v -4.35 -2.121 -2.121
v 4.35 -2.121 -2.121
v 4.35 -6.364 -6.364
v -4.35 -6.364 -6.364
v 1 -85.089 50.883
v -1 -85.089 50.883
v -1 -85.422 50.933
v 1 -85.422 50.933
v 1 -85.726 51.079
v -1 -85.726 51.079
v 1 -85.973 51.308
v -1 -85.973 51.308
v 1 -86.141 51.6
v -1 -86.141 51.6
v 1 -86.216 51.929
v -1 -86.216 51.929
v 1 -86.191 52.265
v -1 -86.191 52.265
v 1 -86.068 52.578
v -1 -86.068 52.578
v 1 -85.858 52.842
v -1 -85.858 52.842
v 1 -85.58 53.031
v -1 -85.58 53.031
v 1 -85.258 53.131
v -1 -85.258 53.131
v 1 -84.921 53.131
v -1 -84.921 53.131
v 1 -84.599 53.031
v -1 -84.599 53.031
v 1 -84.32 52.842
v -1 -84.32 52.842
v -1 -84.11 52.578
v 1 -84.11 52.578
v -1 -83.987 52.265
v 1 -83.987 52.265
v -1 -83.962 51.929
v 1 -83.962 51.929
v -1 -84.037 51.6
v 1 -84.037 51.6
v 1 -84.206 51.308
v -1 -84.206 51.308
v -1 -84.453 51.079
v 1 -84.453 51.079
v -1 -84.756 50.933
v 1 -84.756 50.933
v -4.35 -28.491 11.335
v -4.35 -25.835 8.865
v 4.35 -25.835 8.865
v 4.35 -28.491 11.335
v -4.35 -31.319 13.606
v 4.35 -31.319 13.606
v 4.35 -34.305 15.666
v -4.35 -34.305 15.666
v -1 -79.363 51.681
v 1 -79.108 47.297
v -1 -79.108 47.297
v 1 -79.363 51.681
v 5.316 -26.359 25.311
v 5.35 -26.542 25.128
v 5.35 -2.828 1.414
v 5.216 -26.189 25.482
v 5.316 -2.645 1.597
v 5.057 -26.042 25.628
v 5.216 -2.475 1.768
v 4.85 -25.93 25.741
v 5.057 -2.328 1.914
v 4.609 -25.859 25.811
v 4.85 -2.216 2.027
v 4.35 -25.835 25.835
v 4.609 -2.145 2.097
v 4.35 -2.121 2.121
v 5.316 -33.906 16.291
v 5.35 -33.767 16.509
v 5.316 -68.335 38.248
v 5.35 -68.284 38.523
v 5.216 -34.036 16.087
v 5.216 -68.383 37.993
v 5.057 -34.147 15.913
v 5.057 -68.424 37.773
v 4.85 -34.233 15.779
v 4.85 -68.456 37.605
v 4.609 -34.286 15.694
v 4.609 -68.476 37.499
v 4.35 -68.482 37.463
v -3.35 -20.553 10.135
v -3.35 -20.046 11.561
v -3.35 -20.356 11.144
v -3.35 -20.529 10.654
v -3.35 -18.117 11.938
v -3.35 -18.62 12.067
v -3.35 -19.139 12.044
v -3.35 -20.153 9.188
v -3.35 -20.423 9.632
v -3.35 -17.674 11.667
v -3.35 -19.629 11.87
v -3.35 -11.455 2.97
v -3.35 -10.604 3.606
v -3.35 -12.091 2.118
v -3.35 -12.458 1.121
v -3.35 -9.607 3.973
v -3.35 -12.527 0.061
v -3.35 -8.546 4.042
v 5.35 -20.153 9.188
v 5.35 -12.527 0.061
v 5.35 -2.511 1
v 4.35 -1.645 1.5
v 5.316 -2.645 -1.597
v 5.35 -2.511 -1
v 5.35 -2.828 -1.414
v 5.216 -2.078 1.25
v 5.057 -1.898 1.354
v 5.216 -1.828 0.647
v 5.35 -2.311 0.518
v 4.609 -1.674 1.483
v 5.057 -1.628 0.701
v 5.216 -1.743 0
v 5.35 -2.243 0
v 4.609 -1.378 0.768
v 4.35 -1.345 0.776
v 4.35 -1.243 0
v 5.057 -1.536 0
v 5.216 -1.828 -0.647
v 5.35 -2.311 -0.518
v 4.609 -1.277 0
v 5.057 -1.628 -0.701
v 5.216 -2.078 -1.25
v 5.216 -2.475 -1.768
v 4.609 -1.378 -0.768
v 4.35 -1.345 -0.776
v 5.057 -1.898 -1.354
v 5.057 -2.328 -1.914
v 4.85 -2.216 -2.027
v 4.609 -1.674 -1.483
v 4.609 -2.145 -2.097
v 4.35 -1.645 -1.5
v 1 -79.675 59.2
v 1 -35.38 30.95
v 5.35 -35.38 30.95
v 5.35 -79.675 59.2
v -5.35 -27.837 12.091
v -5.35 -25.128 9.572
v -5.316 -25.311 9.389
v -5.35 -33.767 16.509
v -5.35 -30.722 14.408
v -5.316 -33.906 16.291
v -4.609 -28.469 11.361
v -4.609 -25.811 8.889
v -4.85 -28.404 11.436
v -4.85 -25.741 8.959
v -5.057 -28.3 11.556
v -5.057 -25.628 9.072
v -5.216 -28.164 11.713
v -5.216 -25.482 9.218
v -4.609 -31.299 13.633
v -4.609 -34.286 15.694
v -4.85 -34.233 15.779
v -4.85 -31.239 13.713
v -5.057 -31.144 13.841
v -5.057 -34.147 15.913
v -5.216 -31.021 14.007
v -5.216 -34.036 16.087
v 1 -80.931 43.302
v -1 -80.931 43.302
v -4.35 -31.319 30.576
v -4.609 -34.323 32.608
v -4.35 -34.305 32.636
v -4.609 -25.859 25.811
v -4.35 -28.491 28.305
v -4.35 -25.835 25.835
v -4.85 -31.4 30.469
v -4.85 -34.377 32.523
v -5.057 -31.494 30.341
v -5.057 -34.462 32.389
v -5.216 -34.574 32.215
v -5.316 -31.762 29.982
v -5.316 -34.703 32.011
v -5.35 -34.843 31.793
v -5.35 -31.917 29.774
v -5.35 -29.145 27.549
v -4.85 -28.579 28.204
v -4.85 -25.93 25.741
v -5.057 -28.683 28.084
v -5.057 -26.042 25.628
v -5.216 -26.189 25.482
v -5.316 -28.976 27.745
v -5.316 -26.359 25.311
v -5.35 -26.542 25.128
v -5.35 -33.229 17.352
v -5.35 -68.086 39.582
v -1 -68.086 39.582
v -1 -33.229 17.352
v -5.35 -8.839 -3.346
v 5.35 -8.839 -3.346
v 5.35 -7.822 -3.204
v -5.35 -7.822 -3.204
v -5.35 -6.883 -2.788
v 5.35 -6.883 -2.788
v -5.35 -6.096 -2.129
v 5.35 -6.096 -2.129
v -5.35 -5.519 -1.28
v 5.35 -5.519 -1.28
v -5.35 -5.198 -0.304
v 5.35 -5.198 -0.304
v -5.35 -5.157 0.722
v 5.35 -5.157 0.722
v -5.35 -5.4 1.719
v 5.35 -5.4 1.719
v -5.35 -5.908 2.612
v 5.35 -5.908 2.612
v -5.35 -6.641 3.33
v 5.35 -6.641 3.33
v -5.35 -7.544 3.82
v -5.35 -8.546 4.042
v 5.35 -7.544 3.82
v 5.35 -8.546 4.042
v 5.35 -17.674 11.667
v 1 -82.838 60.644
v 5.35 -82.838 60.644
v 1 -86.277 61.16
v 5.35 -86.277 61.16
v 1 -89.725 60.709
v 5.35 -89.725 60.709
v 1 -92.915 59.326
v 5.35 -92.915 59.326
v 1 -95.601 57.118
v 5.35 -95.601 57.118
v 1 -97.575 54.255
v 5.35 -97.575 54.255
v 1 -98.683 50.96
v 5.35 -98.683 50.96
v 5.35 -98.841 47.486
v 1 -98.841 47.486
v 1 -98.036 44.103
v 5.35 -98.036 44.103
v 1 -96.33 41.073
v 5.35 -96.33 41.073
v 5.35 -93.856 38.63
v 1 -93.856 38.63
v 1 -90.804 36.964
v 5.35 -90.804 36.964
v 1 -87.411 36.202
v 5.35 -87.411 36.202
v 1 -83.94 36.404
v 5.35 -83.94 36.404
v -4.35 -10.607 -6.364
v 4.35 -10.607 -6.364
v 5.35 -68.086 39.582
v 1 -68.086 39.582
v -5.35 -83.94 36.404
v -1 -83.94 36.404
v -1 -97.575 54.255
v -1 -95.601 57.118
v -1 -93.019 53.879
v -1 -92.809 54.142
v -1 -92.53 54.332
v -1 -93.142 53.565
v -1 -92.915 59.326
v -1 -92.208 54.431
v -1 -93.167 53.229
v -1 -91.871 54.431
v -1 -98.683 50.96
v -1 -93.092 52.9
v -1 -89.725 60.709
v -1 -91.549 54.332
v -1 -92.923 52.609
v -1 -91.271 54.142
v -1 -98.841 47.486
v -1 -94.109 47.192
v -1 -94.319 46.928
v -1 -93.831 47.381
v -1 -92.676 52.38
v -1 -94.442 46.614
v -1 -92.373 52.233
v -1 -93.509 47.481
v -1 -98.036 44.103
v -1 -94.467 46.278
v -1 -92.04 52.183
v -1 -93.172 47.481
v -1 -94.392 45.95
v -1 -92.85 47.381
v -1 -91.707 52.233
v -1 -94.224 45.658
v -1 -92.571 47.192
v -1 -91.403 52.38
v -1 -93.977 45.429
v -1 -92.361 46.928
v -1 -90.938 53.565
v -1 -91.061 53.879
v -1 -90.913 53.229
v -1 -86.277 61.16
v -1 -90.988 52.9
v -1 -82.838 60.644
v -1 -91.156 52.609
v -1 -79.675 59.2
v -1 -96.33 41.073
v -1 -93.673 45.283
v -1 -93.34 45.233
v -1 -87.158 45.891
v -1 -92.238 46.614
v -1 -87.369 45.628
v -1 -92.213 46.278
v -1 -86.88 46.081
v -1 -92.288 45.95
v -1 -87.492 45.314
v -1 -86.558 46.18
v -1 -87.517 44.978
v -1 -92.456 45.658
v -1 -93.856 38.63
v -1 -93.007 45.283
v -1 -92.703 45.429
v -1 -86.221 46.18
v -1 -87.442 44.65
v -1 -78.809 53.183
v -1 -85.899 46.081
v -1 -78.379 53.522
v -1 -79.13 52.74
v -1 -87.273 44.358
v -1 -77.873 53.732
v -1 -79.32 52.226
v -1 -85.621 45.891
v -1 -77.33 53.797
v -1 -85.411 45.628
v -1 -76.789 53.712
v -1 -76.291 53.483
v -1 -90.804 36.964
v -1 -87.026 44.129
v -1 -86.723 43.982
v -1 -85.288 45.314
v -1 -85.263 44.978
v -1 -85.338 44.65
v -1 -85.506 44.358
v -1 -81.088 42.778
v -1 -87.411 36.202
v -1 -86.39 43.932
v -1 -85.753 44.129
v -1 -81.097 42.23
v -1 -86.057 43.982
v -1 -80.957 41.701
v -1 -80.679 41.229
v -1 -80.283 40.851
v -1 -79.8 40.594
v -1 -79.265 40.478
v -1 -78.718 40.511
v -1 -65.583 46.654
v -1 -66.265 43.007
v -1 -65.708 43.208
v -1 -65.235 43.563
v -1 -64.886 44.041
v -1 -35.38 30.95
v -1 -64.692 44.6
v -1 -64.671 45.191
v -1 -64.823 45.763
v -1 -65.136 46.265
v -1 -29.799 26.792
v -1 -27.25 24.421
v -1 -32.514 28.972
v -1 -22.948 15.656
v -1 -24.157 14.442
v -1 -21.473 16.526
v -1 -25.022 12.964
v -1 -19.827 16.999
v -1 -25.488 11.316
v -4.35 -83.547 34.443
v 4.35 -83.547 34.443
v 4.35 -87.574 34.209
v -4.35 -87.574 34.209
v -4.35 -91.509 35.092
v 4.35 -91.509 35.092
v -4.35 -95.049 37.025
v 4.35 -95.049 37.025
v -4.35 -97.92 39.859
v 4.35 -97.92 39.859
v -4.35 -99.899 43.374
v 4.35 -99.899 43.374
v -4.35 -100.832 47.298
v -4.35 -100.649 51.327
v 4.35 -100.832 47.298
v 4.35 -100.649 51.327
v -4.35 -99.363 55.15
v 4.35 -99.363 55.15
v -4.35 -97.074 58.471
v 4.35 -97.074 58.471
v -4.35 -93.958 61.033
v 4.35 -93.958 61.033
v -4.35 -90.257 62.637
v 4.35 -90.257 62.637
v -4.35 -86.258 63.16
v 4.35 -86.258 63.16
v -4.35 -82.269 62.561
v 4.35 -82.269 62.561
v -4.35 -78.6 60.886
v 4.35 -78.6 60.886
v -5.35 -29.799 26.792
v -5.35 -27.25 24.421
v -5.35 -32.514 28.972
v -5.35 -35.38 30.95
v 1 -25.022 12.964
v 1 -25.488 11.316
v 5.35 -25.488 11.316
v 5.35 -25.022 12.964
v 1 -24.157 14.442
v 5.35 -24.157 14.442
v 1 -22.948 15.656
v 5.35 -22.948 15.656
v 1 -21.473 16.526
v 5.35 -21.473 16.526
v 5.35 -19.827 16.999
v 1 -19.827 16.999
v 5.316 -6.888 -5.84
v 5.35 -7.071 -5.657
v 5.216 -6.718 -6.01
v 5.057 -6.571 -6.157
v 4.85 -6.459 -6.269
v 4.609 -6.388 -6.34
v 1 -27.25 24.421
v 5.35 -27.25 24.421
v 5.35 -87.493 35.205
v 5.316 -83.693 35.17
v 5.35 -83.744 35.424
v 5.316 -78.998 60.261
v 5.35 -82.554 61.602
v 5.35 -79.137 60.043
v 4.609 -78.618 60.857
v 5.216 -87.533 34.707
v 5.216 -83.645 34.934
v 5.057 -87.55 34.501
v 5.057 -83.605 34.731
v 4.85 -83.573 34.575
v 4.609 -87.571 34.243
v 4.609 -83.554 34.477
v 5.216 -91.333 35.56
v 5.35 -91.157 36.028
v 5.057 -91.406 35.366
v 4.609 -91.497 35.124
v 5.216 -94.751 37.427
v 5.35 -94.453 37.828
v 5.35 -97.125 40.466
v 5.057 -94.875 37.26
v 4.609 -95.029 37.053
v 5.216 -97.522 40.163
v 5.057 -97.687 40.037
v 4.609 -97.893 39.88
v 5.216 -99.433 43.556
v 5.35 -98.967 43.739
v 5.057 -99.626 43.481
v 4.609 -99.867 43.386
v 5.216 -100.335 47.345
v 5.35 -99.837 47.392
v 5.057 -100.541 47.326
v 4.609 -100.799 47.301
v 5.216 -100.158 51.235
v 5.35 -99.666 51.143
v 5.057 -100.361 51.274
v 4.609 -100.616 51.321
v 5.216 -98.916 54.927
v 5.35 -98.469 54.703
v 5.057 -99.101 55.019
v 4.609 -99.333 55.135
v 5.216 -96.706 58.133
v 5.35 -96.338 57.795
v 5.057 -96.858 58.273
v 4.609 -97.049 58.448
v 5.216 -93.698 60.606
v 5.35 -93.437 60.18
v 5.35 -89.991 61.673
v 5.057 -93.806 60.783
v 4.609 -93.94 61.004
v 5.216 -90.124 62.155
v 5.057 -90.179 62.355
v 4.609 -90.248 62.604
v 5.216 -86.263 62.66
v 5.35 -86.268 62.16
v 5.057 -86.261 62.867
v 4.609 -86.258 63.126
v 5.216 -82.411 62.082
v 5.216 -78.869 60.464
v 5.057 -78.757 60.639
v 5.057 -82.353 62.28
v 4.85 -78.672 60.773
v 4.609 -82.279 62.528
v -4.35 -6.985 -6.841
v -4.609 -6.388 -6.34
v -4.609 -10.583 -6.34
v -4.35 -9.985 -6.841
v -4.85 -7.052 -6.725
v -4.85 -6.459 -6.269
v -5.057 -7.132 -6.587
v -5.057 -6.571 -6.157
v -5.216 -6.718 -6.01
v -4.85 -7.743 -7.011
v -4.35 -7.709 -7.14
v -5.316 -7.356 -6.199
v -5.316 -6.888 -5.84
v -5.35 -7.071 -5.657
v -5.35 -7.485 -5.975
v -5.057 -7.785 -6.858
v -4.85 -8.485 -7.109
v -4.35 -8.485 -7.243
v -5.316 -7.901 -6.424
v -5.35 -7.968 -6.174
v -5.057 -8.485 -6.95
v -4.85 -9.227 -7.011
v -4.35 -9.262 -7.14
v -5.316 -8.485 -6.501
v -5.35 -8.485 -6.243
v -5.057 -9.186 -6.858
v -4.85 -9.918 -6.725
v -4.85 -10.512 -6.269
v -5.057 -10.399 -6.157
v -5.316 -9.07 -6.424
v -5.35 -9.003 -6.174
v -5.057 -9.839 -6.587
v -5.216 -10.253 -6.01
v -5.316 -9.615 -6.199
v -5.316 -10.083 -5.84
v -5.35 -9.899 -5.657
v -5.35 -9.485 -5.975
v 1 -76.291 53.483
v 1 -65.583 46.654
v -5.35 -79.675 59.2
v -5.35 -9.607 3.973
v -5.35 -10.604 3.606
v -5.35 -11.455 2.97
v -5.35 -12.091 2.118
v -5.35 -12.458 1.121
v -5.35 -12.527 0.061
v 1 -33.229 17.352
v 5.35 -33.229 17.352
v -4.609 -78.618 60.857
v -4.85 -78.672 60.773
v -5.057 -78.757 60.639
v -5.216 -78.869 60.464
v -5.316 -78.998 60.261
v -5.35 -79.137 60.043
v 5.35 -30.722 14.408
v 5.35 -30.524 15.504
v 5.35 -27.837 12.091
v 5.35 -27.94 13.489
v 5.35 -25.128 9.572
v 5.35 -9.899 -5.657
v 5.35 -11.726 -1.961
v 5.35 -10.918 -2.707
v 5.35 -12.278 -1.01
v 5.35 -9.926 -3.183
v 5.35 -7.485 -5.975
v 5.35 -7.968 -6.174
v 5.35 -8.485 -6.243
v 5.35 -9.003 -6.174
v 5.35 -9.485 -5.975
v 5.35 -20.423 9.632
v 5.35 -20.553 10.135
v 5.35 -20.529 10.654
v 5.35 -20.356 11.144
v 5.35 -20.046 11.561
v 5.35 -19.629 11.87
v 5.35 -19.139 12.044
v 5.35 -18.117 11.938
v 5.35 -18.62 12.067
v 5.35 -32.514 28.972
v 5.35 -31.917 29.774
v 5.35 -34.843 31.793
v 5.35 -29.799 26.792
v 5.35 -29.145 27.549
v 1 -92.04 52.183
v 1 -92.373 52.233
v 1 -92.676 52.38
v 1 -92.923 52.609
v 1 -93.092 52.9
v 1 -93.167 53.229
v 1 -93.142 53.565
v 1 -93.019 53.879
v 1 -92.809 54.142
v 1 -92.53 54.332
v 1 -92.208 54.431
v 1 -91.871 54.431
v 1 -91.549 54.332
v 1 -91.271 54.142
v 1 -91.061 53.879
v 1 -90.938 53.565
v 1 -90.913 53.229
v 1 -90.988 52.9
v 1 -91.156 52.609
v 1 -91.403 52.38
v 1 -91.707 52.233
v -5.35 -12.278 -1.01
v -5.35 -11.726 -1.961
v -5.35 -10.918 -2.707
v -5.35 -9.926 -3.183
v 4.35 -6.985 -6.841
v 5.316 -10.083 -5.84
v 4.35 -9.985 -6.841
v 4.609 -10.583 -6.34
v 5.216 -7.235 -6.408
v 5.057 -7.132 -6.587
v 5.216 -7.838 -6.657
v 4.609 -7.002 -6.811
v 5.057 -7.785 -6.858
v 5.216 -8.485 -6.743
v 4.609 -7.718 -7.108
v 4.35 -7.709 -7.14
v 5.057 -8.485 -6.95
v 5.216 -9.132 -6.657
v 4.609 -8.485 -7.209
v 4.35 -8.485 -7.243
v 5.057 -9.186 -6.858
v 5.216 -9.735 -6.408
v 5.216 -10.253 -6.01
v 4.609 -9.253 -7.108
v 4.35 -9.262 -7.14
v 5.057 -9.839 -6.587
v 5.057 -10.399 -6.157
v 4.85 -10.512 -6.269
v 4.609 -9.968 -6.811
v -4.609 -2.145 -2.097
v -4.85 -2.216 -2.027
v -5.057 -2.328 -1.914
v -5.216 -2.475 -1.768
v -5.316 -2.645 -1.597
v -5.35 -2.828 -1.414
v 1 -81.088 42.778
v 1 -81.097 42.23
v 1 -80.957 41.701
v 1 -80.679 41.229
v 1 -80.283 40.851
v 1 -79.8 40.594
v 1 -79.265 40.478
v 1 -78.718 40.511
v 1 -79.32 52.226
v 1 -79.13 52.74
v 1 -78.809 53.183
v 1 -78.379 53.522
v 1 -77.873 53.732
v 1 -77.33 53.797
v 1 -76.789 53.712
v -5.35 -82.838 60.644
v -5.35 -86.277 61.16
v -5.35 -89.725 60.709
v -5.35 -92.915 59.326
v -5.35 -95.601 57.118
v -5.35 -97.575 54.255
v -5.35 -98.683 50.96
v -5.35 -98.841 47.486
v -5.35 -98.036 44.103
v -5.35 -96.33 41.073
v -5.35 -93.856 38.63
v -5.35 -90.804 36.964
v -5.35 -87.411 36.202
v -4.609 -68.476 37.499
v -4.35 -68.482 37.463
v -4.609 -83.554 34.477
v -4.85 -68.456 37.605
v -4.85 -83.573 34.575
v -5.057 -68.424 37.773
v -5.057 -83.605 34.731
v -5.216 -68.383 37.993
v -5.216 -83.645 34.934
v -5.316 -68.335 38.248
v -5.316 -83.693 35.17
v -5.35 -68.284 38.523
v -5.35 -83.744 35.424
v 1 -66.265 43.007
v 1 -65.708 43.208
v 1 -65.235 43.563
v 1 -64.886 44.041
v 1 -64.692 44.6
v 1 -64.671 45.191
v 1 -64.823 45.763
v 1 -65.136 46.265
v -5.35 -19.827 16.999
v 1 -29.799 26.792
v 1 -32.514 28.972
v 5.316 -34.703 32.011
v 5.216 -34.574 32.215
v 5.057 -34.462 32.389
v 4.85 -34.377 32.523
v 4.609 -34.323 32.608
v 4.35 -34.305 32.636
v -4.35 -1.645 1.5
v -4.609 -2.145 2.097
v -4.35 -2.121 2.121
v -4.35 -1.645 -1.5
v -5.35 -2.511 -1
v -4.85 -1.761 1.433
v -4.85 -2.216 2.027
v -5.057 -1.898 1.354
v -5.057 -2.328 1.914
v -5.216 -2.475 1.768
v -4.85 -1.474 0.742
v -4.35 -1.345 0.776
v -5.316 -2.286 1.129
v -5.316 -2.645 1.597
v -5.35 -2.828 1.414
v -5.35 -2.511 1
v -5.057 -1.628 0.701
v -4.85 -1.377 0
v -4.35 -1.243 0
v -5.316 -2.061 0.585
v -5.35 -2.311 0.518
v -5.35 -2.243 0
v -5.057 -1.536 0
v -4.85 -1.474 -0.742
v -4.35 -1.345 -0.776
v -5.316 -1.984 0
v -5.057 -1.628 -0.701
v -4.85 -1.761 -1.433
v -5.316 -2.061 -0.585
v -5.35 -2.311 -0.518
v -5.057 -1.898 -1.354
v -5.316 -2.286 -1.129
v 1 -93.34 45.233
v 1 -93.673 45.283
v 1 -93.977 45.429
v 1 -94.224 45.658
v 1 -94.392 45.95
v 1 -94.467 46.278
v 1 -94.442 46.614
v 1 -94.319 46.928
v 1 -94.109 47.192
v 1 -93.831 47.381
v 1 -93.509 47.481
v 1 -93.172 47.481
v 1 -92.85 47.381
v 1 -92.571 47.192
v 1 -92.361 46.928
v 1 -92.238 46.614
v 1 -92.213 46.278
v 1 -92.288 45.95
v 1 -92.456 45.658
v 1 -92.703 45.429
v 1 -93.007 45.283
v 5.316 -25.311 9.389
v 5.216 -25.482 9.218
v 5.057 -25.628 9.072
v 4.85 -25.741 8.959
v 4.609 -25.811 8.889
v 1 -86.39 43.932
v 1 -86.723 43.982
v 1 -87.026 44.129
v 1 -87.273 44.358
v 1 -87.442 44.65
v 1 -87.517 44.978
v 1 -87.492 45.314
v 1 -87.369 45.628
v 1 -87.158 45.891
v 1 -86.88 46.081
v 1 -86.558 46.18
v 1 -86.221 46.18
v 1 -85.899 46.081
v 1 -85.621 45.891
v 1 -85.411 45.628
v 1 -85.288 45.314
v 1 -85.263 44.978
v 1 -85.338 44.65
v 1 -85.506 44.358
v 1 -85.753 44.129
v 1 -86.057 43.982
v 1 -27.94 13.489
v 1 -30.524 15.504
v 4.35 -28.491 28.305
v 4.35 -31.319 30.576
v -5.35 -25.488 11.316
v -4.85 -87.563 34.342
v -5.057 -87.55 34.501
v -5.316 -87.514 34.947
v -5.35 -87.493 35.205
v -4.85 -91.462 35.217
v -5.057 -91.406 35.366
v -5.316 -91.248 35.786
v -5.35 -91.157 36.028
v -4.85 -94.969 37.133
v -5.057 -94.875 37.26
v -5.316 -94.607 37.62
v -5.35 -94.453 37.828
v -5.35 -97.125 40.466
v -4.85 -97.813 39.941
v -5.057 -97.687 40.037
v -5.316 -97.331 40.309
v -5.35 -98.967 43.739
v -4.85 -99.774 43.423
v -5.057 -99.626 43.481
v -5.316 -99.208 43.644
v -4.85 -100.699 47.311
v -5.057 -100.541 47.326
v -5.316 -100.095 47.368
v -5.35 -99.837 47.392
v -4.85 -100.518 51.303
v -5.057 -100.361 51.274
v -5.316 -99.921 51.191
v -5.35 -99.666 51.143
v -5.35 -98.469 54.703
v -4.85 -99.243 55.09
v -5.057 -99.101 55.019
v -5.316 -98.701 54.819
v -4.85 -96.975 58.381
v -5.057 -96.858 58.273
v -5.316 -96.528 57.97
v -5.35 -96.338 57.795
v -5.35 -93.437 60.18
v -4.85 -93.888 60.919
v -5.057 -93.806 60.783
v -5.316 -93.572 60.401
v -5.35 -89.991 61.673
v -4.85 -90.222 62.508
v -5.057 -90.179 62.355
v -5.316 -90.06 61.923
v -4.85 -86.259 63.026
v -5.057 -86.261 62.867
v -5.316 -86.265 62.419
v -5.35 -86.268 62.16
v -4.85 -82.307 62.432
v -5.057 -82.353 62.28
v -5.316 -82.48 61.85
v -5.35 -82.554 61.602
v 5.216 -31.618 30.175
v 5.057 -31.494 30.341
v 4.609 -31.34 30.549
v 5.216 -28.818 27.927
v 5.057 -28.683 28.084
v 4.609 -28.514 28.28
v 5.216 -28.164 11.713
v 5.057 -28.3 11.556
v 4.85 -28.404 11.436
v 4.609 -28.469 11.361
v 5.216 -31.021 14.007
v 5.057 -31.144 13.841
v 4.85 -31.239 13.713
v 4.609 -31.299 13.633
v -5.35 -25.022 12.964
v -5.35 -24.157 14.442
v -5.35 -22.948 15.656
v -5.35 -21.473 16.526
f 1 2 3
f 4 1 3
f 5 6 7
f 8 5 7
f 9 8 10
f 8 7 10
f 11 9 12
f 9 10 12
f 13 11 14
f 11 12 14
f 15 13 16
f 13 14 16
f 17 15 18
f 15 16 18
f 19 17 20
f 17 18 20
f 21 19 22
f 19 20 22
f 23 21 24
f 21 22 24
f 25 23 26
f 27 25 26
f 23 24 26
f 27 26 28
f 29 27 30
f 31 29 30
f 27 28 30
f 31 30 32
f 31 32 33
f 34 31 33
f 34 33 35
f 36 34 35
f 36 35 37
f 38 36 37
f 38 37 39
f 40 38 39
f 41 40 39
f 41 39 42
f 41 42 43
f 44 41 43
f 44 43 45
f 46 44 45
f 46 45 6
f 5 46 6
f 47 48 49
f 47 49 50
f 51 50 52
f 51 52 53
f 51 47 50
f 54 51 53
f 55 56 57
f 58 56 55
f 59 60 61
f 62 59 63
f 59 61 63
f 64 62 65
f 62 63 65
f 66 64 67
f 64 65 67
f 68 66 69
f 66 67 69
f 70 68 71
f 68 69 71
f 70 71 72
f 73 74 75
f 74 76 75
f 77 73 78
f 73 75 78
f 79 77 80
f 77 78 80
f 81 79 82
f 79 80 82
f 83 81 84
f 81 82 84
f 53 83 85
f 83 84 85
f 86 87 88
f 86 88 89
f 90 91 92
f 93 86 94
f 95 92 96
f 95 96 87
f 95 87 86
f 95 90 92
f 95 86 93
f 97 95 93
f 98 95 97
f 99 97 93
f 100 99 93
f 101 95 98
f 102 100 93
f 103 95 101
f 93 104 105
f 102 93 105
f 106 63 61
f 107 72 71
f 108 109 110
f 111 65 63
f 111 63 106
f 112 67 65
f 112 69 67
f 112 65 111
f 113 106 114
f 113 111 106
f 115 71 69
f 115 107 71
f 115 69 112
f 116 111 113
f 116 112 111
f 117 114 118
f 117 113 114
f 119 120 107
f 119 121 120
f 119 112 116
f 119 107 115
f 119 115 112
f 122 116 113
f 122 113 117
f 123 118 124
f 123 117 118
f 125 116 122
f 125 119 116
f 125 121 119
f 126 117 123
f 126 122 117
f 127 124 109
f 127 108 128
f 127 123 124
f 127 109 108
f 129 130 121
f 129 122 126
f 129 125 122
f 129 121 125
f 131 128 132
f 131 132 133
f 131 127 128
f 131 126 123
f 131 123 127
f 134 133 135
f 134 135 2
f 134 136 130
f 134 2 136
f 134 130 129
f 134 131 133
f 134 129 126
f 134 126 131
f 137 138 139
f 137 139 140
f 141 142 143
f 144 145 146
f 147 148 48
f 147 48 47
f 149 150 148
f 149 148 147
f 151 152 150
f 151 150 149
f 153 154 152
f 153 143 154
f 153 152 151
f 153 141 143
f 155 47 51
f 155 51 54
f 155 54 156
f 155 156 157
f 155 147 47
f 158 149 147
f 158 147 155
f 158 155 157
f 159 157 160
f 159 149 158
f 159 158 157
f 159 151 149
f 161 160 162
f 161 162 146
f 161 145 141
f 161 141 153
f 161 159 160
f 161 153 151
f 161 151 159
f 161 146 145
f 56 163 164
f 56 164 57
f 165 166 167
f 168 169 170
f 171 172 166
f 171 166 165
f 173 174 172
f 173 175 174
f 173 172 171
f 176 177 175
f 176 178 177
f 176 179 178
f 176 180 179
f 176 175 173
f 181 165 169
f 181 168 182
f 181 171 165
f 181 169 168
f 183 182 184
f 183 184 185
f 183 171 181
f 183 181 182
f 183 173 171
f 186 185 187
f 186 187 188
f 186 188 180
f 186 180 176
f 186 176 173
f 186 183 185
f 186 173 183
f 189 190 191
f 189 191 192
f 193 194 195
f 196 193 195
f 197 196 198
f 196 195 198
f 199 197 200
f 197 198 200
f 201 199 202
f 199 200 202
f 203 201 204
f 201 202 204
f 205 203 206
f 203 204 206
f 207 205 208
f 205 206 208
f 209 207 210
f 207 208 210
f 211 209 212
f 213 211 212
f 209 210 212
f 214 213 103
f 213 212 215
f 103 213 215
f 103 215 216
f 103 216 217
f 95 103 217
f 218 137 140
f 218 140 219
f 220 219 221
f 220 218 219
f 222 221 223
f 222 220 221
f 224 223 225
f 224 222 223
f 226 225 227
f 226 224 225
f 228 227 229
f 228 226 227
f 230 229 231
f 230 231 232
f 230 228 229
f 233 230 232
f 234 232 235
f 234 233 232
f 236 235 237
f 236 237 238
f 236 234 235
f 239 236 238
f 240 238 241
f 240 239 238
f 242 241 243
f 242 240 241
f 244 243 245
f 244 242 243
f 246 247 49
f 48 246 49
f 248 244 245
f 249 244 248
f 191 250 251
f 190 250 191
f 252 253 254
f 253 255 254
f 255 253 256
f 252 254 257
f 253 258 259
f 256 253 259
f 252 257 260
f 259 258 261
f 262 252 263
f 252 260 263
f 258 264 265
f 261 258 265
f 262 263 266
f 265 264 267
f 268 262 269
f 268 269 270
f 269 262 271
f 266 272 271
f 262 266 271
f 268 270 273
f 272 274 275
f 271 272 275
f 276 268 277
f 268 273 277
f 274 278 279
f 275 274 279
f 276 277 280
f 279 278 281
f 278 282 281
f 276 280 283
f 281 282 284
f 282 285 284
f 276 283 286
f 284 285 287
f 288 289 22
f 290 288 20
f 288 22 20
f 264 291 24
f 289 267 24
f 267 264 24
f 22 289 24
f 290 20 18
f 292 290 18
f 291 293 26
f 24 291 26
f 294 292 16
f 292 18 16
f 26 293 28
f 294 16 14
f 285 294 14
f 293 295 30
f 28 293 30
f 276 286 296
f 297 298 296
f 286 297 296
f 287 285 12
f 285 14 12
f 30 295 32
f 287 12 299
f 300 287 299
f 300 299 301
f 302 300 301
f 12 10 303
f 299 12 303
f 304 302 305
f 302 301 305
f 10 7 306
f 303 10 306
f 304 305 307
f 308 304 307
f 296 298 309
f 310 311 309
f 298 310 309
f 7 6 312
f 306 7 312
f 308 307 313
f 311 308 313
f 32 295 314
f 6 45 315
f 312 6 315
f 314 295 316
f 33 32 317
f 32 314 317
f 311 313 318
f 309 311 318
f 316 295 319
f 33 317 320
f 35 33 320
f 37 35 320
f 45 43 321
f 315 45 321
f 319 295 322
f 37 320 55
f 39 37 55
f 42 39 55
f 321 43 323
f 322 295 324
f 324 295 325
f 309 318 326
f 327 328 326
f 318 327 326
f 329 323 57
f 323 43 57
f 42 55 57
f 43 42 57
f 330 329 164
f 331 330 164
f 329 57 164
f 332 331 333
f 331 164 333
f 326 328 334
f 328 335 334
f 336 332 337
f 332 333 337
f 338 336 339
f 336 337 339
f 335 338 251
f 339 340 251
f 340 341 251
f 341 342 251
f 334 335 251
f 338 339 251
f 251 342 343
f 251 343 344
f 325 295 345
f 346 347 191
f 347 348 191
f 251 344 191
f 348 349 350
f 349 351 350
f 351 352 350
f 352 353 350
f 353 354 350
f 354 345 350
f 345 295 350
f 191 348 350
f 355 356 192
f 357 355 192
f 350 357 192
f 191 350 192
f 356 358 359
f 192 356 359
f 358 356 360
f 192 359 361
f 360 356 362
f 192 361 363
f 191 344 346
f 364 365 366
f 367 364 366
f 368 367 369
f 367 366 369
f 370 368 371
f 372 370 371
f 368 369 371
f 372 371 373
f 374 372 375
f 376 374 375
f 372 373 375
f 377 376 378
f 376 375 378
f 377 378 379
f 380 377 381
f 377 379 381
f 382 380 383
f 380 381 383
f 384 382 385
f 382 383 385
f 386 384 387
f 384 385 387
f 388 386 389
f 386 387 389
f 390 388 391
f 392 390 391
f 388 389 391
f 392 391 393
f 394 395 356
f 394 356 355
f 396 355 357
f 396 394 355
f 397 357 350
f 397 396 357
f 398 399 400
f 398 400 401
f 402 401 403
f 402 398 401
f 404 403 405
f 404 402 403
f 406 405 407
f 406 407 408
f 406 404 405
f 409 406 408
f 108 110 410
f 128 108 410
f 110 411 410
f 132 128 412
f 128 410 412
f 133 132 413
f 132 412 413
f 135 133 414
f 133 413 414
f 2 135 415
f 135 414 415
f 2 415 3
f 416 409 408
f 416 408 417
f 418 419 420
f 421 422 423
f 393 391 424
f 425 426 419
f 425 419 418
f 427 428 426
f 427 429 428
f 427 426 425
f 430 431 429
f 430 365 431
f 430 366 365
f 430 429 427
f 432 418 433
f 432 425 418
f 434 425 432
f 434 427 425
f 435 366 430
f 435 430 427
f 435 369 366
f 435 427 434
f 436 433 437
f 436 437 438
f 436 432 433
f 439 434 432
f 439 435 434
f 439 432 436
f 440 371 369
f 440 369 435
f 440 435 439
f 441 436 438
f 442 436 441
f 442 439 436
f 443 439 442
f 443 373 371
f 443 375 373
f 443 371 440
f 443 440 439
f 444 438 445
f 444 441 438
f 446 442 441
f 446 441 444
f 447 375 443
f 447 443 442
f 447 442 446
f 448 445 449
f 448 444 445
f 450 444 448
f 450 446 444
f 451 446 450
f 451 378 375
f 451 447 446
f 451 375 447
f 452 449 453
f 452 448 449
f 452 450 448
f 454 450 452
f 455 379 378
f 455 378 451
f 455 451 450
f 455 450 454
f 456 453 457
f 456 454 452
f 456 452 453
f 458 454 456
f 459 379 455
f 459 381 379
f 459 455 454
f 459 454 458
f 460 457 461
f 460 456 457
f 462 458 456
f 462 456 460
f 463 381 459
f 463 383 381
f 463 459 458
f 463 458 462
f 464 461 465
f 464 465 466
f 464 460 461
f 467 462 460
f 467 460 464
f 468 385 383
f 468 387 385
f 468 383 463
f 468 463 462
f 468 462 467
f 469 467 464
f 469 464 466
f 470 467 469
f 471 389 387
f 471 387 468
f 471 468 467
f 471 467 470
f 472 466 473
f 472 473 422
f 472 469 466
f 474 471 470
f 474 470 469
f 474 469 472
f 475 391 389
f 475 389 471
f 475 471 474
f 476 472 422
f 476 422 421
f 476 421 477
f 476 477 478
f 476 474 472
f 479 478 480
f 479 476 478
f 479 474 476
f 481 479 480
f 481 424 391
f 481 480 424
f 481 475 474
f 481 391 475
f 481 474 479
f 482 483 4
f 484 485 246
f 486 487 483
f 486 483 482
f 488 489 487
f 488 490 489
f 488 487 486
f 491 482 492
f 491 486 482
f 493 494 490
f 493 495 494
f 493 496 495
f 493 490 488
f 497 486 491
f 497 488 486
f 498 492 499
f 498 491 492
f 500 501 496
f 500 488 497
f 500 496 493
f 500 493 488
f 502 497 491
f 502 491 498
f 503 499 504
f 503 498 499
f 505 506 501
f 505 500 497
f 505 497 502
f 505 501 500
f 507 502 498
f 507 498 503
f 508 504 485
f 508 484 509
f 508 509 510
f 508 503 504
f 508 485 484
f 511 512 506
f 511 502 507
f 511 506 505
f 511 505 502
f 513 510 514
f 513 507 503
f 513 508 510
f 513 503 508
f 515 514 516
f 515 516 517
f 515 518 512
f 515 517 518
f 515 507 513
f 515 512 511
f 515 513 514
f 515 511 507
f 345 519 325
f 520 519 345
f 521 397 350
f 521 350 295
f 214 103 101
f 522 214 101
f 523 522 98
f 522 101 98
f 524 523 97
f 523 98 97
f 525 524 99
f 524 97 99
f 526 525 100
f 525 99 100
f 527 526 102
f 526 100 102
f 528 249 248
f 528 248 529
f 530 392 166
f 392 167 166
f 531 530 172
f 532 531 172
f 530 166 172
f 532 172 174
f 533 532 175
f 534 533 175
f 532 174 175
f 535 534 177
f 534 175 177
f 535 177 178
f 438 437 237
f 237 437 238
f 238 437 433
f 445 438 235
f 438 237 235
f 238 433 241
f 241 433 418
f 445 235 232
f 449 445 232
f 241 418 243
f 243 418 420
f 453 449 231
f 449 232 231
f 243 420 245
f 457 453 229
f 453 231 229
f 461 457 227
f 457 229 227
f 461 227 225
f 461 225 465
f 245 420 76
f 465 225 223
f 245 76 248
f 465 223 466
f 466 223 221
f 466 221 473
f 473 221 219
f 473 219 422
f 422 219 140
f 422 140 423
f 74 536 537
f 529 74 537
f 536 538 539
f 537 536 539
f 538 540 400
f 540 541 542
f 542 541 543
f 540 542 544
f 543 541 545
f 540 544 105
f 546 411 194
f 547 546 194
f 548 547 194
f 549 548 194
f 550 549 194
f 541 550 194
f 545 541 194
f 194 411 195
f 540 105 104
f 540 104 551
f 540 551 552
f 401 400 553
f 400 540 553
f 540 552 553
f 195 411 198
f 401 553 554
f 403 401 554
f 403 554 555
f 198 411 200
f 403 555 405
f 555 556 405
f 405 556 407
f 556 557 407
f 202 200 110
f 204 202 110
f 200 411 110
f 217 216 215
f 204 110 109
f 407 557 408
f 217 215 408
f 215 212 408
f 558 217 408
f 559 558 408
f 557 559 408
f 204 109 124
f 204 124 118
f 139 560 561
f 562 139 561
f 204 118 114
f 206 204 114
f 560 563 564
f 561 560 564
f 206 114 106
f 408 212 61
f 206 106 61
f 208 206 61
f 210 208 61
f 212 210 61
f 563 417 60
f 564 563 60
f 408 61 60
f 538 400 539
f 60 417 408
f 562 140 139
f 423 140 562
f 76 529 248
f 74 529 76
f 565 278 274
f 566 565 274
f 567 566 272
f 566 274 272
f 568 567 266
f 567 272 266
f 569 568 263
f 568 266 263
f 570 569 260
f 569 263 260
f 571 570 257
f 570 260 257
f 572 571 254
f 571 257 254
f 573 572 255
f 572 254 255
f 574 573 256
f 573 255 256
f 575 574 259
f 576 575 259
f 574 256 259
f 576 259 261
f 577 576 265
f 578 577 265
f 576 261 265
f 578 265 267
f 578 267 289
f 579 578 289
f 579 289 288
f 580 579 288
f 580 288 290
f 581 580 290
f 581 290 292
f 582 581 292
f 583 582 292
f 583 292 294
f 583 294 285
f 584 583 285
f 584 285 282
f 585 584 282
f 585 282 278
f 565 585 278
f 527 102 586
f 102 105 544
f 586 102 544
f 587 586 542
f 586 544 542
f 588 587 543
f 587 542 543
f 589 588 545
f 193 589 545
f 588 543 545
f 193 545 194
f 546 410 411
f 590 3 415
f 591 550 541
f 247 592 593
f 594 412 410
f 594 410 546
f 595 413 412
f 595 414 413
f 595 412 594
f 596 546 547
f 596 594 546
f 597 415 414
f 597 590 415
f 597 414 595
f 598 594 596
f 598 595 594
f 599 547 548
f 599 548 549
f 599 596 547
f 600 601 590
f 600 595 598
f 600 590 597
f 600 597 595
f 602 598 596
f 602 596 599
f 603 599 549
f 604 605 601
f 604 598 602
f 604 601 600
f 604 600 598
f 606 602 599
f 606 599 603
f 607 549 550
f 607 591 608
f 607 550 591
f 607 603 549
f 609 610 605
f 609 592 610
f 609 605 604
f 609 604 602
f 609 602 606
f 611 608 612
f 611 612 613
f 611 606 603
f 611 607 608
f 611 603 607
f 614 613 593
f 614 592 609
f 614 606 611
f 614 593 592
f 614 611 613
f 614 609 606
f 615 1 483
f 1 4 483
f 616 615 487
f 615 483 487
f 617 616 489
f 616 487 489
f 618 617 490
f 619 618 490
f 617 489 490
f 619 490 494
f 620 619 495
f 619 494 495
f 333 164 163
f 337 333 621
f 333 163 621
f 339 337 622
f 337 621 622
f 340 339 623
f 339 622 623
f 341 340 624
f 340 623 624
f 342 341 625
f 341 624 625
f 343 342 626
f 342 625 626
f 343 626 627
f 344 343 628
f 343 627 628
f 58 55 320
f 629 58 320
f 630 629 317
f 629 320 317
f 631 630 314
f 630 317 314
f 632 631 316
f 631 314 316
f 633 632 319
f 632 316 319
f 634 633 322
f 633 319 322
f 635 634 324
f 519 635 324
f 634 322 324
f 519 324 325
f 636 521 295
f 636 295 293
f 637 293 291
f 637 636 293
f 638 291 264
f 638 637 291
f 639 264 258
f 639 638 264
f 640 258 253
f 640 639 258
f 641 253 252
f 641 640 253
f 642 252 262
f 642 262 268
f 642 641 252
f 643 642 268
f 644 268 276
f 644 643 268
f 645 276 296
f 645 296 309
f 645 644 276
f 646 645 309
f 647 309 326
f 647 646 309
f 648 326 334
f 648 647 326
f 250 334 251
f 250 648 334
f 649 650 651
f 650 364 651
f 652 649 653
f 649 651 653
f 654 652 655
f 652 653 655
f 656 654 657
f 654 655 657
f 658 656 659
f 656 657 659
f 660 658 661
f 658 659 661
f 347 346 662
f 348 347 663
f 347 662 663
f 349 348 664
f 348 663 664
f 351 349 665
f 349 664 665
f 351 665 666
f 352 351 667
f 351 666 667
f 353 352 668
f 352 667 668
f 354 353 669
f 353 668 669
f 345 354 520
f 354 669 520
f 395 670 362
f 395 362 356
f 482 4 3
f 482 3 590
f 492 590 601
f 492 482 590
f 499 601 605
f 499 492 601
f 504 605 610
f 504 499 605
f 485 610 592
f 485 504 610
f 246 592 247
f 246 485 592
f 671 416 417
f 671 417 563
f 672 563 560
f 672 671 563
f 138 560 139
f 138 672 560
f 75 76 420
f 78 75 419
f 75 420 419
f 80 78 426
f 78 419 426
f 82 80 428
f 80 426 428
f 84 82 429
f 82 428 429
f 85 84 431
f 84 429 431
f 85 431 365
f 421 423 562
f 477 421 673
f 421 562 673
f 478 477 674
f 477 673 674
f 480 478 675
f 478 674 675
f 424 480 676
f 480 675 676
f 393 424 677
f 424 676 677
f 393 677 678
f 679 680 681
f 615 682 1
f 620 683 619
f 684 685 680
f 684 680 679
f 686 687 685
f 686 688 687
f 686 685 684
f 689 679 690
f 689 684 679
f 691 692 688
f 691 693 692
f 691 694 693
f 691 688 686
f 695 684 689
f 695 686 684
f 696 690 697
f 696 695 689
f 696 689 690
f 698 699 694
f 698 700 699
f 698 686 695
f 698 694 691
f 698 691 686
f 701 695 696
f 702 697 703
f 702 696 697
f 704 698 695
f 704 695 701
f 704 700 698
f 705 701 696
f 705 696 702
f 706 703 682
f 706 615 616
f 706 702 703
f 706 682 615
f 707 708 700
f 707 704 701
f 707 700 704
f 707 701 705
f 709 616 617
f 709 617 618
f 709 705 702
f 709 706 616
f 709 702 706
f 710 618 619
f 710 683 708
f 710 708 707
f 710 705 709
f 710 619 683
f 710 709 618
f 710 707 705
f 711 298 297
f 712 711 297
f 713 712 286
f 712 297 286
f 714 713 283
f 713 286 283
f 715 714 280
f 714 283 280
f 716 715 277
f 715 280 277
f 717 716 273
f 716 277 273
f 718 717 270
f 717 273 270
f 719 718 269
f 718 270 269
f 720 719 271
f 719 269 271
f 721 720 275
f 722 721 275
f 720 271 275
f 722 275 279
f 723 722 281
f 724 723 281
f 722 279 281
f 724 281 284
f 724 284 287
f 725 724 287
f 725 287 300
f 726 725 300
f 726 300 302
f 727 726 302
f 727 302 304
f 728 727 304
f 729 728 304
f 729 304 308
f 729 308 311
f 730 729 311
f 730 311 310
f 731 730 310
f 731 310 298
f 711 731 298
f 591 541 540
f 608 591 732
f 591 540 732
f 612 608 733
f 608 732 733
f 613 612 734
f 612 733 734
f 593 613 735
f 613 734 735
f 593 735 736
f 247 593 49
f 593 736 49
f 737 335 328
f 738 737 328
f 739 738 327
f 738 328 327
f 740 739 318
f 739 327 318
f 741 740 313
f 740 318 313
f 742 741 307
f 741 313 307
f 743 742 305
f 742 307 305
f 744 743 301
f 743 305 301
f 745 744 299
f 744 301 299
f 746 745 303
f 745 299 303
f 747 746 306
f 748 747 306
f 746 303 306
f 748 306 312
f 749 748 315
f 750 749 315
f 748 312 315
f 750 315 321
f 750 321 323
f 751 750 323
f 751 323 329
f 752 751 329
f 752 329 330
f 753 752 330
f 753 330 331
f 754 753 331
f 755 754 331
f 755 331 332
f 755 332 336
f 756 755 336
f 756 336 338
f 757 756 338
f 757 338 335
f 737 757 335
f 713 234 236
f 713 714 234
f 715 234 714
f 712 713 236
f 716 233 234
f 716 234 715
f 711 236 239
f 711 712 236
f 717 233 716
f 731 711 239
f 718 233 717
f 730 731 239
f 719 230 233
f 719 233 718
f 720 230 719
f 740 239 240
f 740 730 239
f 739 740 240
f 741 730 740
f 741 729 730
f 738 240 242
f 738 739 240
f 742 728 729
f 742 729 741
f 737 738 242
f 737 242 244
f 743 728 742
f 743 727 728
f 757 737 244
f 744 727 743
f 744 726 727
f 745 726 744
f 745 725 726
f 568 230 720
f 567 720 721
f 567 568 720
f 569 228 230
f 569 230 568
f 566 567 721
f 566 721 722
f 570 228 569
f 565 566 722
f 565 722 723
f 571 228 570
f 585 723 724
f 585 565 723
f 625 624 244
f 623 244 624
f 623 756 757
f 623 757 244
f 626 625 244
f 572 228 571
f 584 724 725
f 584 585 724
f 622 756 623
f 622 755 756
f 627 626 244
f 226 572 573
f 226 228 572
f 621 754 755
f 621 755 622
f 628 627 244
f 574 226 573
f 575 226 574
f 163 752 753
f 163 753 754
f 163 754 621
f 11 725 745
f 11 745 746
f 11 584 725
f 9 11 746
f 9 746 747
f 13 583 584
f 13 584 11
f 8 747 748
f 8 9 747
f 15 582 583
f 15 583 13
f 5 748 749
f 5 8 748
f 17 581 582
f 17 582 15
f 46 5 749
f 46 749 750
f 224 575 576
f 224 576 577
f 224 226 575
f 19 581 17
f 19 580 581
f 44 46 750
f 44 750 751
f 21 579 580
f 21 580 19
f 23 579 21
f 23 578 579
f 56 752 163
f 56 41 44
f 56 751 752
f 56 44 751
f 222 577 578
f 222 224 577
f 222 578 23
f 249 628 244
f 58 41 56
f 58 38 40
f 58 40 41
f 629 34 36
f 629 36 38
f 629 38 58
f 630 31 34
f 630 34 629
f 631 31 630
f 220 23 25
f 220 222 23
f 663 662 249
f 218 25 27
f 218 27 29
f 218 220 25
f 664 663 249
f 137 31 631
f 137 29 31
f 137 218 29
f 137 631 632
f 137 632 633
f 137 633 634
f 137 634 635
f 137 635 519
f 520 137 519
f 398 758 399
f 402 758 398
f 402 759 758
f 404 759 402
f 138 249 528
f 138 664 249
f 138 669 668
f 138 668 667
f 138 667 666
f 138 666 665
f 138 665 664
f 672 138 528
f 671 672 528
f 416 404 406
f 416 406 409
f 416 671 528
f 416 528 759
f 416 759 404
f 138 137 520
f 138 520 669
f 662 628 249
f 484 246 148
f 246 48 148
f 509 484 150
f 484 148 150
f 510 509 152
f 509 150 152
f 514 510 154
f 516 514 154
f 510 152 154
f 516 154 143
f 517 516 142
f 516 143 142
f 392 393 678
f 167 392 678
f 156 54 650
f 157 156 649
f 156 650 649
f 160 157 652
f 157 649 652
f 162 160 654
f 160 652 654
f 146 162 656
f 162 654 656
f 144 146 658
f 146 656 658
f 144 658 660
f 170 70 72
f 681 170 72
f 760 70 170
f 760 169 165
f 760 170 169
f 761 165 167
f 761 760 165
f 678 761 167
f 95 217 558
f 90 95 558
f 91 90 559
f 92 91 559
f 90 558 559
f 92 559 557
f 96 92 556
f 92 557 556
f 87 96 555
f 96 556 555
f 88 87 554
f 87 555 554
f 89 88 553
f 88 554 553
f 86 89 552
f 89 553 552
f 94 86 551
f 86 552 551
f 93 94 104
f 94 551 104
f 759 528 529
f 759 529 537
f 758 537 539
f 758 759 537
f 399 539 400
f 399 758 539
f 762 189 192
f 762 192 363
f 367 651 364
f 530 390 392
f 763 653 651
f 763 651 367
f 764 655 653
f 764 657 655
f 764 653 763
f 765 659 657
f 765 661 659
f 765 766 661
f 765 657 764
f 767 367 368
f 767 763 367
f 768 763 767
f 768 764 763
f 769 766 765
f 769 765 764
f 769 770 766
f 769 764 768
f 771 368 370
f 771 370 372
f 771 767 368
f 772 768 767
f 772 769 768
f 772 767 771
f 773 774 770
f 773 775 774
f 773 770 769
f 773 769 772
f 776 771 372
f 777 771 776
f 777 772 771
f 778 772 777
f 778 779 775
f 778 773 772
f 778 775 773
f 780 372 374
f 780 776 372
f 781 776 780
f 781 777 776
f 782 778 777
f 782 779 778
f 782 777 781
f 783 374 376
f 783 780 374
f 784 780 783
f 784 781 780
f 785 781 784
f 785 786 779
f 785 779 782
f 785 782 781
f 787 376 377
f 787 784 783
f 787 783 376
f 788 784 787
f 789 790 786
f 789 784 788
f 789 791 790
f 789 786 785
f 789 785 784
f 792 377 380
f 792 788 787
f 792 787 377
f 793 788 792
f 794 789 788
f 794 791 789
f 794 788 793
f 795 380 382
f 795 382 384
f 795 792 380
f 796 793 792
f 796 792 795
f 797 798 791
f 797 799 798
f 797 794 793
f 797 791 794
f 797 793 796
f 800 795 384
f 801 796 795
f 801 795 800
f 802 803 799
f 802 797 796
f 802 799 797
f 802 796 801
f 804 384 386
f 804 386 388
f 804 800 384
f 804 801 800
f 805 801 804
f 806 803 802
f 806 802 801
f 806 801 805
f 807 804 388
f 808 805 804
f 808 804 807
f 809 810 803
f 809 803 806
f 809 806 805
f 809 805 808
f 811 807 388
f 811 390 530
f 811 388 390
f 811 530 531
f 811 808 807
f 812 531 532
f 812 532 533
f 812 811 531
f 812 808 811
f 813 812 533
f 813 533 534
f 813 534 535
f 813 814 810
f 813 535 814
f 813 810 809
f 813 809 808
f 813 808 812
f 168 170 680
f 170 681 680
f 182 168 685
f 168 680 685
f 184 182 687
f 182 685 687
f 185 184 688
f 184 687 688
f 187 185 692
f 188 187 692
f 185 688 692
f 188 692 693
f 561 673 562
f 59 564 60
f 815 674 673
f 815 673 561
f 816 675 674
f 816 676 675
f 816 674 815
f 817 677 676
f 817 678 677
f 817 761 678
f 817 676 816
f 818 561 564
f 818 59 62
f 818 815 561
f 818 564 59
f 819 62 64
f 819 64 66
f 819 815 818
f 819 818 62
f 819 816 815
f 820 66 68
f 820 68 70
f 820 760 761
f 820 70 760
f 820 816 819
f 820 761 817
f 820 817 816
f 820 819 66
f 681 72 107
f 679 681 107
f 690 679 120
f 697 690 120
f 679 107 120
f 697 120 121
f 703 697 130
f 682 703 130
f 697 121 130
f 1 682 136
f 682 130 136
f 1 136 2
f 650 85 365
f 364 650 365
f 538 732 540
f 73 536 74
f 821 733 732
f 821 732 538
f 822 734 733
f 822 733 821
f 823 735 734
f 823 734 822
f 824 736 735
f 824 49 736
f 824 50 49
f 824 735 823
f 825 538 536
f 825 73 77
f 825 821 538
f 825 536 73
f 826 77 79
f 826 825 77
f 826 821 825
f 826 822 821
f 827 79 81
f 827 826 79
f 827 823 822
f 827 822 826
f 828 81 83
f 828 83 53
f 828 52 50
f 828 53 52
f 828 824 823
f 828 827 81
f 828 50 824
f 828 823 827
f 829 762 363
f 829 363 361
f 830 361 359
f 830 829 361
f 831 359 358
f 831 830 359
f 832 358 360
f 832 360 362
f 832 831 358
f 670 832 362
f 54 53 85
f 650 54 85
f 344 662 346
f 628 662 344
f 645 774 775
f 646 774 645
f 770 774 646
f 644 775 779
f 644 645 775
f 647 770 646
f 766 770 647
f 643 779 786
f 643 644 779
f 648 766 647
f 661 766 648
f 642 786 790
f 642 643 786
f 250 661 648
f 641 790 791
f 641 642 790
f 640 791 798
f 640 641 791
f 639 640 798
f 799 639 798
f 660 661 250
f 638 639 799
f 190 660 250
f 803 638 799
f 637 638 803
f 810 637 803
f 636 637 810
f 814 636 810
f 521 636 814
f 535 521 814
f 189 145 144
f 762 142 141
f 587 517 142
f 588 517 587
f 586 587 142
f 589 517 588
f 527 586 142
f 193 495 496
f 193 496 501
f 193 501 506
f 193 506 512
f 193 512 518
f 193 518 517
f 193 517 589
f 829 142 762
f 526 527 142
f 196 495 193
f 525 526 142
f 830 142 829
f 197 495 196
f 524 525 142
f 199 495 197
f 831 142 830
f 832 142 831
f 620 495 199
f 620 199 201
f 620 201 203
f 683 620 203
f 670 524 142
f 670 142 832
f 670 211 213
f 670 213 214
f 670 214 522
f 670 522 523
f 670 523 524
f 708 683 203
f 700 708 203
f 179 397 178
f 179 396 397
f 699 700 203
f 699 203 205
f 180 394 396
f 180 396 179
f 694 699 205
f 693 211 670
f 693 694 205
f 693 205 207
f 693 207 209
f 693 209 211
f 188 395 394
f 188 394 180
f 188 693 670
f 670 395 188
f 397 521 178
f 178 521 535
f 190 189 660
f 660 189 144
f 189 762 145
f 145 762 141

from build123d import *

# Parameters (mm, degrees)
BOSS_EXTRUDE1_DEPTH   = 5.35
FILLET1_R             = 2
FILLET2_R             = 50
FILLET3_R             = 3
CUT_EXTRUDE1_DEPTH    = 120.515289654
CUT_EXTRUDE2_DEPTH    = 8.7
SHELL3_START          = 1
SHELL3_DEPTH          = 4.35
CUT_EXTRUDE3_DEPTH    = 4.35
FILLET6_R             = 1
F_2_CLEARANCE_HOLE1_D = 2.2606


# Read off the part's stored shape, not the designer's step: Shell3
with BuildPart() as part:
    # Sketch1 → Boss-Extrude1 (new, symmetric)
    with BuildSketch(Plane(origin=(0, 0, 0), x_dir=(0, 0, -1), z_dir=(1, 0, 0))):
        with BuildLine():
            Line((0, 0), (8.485281374, -8.485281374))
            Line((8.485281374, -8.485281374), (-12.727922061, -29.69848481))
            Line((-12.727922061, -29.69848481), (-37.462892244, -68.482260413))
            Line((-37.462892244, -68.482260413), (-34.443484132, -83.547139186))
            ThreePointArc((-34.443484132, -83.547139186), (-51.327394218, -100.649341384), (-60.88605591, -78.599767092))
            Line((-60.88605591, -78.599767092), (-29.69848481, -29.69848481))
            Line((-29.69848481, -29.69848481), (0, 0))
        make_face()
        Polygon((-55.587939854, -79.591037977), (-43.982885085, -61.39462065), (-39.741600188, -82.555868301), (-47.296955003, -79.107566033), align=None, mode=Mode.SUBTRACT)
    extrude(amount=BOSS_EXTRUDE1_DEPTH, both=True)

    # Fillet1
    fillet1_edges = [part.edges().sort_by_distance(p)[0] for p in [
        (0, -82.555868301, 39.741600188),
        (0, -61.39462065, 43.982885085),
        (0, -79.591037977, 55.587939854),
    ]]
    fillet(fillet1_edges, radius=FILLET1_R)

    # Fillet2
    fillet2_edges = [part.edges().sort_by_distance(p)[0] for p in [
        (0, -29.69848481, 12.727922061),
        (0, -29.69848481, 29.69848481),
    ]]
    fillet(fillet2_edges, radius=FILLET2_R)

    # Fillet3
    fillet3_edges = [part.edges().sort_by_distance(p)[0] for p in [
        (0, 0, 0),
        (0, -8.485281374, -8.485281374),
    ]]
    fillet(fillet3_edges, radius=FILLET3_R)

    # Sketch2 → Cut-Extrude1 (cut, through all)
    with BuildSketch(Plane(origin=(5.35, 0, 0), x_dir=(0, 0, -1), z_dir=(1, 0, 0))):
        with BuildLine():
            ThreePointArc((3.346446609, -8.838834765), (-0.207139317, -5.141732803), (-4.041965779, -8.546235975))
            ThreePointArc((-4.041965779, -8.546235975), (-2.969848481, -11.455129855), (-0.060954601, -12.527247153))
            ThreePointArc((-0.060954601, -12.527247153), (2.364222862, -11.349550248), (3.346446609, -8.838834765))
        make_face()
    extrude(amount=-CUT_EXTRUDE1_DEPTH, mode=Mode.SUBTRACT)

    # Sketch2<3> → Cut-Extrude2 (cut)
    with BuildSketch(Plane(origin=(5.35, 0, 0), x_dir=(0, 0, -1), z_dir=(1, 0, 0))):
        with BuildLine():
            ThreePointArc((-0.060954601, -12.527247153), (-2.969848481, -11.455129855), (-4.041965779, -8.546235975))
            Line((-4.041965779, -8.546235975), (-11.667353013, -17.673561649))
            ThreePointArc((-11.667353013, -17.673561649), (-11.561195872, -20.046477247), (-9.188280275, -20.152634388))
            Line((-9.188280275, -20.152634388), (-0.060954601, -12.527247153))
        make_face()
    extrude(amount=-CUT_EXTRUDE2_DEPTH, mode=Mode.SUBTRACT)

    # Shell3 outline → Shell3 (cut)
    with BuildSketch(Plane.YZ.offset(SHELL3_START)):
        with BuildLine():
            ThreePointArc((-25.487766305, 11.315546566), (-23.591345049, 15.08737762), (-19.826956258, 16.998529133))
            Line((-19.826956258, 16.998529133), (-27.249508266, 24.421081141))
            ThreePointArc((-27.249508266, 24.421081141), (-31.137049165, 27.906978673), (-35.380230094, 30.949982361))
            Line((-35.380230094, 30.949982361), (-79.675200579, 59.199804797))
            ThreePointArc((-79.675200579, 59.199804797), (-98.683454279, 50.9595792), (-83.940176521, 36.404484299))
            Line((-83.940176521, 36.404484299), (-68.085752059, 39.582138666))
            Line((-68.085752059, 39.582138666), (-33.229363122, 17.351921839))
            ThreePointArc((-33.229363122, 17.351921839), (-29.215798711, 14.516830312), (-25.487766305, 11.315546566))
        make_face()
        with BuildLine():
            ThreePointArc((-78.71831814, 40.510748766), (-80.678728763, 41.229436179), (-80.930811667, 43.302157969))
            Line((-80.930811667, 43.302157969), (-79.107566033, 47.296955003))
            Line((-79.107566033, 47.296955003), (-79.363195628, 51.680706992))
            ThreePointArc((-79.363195628, 51.680706992), (-78.378789867, 53.5220833), (-76.291153896, 53.48338626))
            Line((-76.291153896, 53.48338626), (-65.582774367, 46.653946778))
            ThreePointArc((-65.582774367, 46.653946778), (-64.692320748, 44.599880647), (-66.265170518, 43.006695498))
            Line((-66.265170518, 43.006695498), (-78.71831814, 40.510748766))
        make_face(mode=Mode.SUBTRACT)
    extrude(amount=SHELL3_DEPTH, mode=Mode.SUBTRACT)

    # Sketch3 → Cut-Extrude3 (cut)
    with BuildSketch(Plane.ZY.offset(5.35)):
        with BuildLine():
            Line((16.998529133, -19.826956258), (24.421081141, -27.249508266))
            ThreePointArc((24.421081141, -27.249508266), (27.906978673, -31.137049165), (30.949982361, -35.380230094))
            Line((30.949982361, -35.380230094), (59.199804797, -79.675200579))
            ThreePointArc((59.199804797, -79.675200579), (50.9595792, -98.683454279), (36.404484299, -83.940176521))
            Line((36.404484299, -83.940176521), (39.582138666, -68.085752059))
            Line((39.582138666, -68.085752059), (17.351921839, -33.229363122))
            Line((17.351921839, -33.229363122), (11.315546566, -25.487766305))
            ThreePointArc((11.315546566, -25.487766305), (15.08737762, -23.591345049), (16.998529133, -19.826956258))
        make_face()
    extrude(amount=-CUT_EXTRUDE3_DEPTH, mode=Mode.SUBTRACT)

    # Fillet6
    fillet6_edges = [part.edges().sort_by_distance(p)[0] for p in [
        (5.35, -100.649341384, 51.327394218),
        (5.35, -76.0146998, 35.953188188),
        (5.35, -51.393528511, 26.564281485),
        (-5.35, -18.220948211, 1.250385462),
        (5.35, -18.220948211, 1.250385462),
        (-5.35, -56.45228185, 46.761144692),
        (5.35, -56.45228185, 46.761144692),
        (-5.35, -29.884816473, 29.466437966),
        (5.35, -29.884816473, 29.466437966),
        (-5.35, -29.884816473, 12.495875217),
        (5.35, -29.884816473, 12.495875217),
        (-5.35, -4.242640687, -4.242640687),
        (5.35, -4.242640687, -4.242640687),
        (-5.35, -13.978307524, 13.978307524),
        (-5.35, -1.242640687, 0),
        (-5.35, -8.485281374, -7.242640687),
        (5.35, -13.978307524, 13.978307524),
        (5.35, -1.242640687, 0),
        (5.35, -8.485281374, -7.242640687),
        (-5.35, -51.393528511, 26.564281485),
        (-5.35, -76.0146998, 35.953188188),
        (-5.35, -100.649341384, 51.327394218),
    ]]
    fillet(fillet6_edges, radius=FILLET6_R)

    # #2 Clearance Hole1 (through all)
    with Locations(Plane(origin=(1, -85.089251529, 52.013004842), x_dir=(0, 0, 1), z_dir=(1, 0, 0))):
        with Locations((0, 0), (-6.950460518, 1.300422466), (1.300422466, 6.950460517), (-5.650038052, 8.250882984)):
            Hole(F_2_CLEARANCE_HOLE1_D / 2)


solid = part.part
